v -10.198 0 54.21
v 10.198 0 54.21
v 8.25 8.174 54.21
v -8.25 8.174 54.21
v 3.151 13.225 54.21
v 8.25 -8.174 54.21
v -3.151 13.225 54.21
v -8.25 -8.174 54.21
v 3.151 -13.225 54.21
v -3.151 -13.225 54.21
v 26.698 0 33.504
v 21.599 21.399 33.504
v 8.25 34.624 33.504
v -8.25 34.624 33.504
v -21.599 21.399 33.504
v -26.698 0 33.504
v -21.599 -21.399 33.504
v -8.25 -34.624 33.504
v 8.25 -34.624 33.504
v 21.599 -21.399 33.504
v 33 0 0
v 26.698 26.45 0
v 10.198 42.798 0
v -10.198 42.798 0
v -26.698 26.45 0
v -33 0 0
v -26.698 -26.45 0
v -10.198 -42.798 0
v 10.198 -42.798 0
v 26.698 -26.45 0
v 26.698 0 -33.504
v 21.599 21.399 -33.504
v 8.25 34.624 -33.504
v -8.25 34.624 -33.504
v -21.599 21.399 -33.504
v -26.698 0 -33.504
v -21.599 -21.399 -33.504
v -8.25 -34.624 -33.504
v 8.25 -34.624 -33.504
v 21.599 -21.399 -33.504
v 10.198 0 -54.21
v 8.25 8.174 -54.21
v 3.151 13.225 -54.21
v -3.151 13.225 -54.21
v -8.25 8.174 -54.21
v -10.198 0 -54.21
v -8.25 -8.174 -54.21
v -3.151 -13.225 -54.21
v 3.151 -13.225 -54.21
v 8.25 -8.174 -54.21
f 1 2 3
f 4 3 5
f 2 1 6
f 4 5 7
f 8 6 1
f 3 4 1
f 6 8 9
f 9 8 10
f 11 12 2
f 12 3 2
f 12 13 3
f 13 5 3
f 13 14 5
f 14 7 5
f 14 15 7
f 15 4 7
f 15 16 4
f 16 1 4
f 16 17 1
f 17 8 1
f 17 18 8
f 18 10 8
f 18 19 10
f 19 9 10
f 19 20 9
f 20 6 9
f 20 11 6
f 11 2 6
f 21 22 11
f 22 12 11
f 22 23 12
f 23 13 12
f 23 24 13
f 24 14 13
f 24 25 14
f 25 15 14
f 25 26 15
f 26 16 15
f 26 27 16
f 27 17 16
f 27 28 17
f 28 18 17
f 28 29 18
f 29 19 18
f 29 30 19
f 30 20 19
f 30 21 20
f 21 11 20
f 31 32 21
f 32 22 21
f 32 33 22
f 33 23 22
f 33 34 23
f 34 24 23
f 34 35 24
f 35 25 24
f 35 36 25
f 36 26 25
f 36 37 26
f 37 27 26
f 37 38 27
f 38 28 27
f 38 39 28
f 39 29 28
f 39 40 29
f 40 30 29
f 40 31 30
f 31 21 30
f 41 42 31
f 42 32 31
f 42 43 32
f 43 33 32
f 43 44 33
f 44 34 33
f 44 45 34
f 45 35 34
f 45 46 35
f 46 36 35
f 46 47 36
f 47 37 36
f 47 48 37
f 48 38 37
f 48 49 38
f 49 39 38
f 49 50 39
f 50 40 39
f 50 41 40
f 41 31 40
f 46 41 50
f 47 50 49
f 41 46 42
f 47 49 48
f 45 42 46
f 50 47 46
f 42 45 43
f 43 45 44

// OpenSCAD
// Generated by SolidPython 1.0.1 on 2020-07-29 00:46:50


scale(v = [11, 15, 19]) {
	sphere(r = 3);
}
/***********************************************
*********      SolidPython code:      **********
************************************************
 
# import packages: SolidPython
from solid import *
from solid.utils import *
from itertools import chain, combinations, permutations


class Resize:

    def __init__(self, scad_file):
        self.scad_file = scad_file
        #self.scad_file = import_scad(scad_file)
        # cone/cylinder param:
        self.r1 = 0
        self.r2 = 0
        self.h = 0
        # rectangular prism param:
        self.w = 0
        self.l = 0
        # ellipse param:
        self.r = 0

    # import OpenScad code (file name corresponds to shape)


    # classify shape + parameters
    def assign(self, param1, param2, param3):
        if self.scad_file == 'cone.scad':
            self.r1 = param1
            self.r2 = param2
            self.h = param3
        elif self.scad_file == 'cylinder.scad':
            self.r1 = param1
            self.r2 = param2
            self.h = param3
        elif self.scad_file == 'rectangularPrism.scad':
            self.h = param1
            self.l = param2
            self.w = param3
        else:
            self.r = param1
            self.h = param2

    # resize parameters
    def iterate(self):
        x = range(3, 20, 2)
        i = 1
        if self.scad_file == 'cone.scad':
            tempList = list(permutations(x, 2))
            for temp in tempList:
                param1 = temp[0]
                param2 = temp[1]
                filepath = 'produced_scad_files/' + 'cone' + str(param1) + '_' + str(param2) + '_' + '.scad'
                scad_render_to_file(cylinder(h=param1, r1=param2, r2=0), filepath)

        elif self.scad_file == 'cylinder.scad':
            tempList = list(permutations(x, 3))
            for temp in tempList:
                param1 = temp[0]
                param2 = temp[1]
                filepath = 'produced_scad_files/' + 'cylinder' + str(param1) + '_' + str(param2) + '_' + '.scad'
                scad_render_to_file(cylinder(h=param1, r1=param2, r2=param2), filepath)

        elif self.scad_file == 'rectangularPrism.scad':
            tempList = list(permutations(x, 3))
            for temp in tempList:
                param1 = temp[0]
                param2 = temp[1]
                param3 = temp[2]
                filepath = 'produced_scad_files/' + 'rectangularPrism' + str(param1) + '_' + str(param2) + '_' + str(
                    param3) + '.scad'
                scad_render_to_file(cube(size=(param1, param2, param3)), filepath)

        elif self.scad_file == 'ellipse.scad':
            tempList = list(permutations(x, 4))
            for temp in tempList:
                param1 = temp[0]
                param2 = temp[1]
                param3 = temp[2]
                param4 = temp[3]
                filepath = 'produced_scad_files/' + 'ellipse' + str(param1) + '_' + str(param2) + '_' + str(param3) + '_' + str(param4) + '.scad'
                scad_render_to_file(scale([param1, param2, param3])(sphere(r=param4)), filepath)

    def render_to_scadfile(self):
        scad_render_to_file(scad, 'example.scad') 
 
************************************************/
